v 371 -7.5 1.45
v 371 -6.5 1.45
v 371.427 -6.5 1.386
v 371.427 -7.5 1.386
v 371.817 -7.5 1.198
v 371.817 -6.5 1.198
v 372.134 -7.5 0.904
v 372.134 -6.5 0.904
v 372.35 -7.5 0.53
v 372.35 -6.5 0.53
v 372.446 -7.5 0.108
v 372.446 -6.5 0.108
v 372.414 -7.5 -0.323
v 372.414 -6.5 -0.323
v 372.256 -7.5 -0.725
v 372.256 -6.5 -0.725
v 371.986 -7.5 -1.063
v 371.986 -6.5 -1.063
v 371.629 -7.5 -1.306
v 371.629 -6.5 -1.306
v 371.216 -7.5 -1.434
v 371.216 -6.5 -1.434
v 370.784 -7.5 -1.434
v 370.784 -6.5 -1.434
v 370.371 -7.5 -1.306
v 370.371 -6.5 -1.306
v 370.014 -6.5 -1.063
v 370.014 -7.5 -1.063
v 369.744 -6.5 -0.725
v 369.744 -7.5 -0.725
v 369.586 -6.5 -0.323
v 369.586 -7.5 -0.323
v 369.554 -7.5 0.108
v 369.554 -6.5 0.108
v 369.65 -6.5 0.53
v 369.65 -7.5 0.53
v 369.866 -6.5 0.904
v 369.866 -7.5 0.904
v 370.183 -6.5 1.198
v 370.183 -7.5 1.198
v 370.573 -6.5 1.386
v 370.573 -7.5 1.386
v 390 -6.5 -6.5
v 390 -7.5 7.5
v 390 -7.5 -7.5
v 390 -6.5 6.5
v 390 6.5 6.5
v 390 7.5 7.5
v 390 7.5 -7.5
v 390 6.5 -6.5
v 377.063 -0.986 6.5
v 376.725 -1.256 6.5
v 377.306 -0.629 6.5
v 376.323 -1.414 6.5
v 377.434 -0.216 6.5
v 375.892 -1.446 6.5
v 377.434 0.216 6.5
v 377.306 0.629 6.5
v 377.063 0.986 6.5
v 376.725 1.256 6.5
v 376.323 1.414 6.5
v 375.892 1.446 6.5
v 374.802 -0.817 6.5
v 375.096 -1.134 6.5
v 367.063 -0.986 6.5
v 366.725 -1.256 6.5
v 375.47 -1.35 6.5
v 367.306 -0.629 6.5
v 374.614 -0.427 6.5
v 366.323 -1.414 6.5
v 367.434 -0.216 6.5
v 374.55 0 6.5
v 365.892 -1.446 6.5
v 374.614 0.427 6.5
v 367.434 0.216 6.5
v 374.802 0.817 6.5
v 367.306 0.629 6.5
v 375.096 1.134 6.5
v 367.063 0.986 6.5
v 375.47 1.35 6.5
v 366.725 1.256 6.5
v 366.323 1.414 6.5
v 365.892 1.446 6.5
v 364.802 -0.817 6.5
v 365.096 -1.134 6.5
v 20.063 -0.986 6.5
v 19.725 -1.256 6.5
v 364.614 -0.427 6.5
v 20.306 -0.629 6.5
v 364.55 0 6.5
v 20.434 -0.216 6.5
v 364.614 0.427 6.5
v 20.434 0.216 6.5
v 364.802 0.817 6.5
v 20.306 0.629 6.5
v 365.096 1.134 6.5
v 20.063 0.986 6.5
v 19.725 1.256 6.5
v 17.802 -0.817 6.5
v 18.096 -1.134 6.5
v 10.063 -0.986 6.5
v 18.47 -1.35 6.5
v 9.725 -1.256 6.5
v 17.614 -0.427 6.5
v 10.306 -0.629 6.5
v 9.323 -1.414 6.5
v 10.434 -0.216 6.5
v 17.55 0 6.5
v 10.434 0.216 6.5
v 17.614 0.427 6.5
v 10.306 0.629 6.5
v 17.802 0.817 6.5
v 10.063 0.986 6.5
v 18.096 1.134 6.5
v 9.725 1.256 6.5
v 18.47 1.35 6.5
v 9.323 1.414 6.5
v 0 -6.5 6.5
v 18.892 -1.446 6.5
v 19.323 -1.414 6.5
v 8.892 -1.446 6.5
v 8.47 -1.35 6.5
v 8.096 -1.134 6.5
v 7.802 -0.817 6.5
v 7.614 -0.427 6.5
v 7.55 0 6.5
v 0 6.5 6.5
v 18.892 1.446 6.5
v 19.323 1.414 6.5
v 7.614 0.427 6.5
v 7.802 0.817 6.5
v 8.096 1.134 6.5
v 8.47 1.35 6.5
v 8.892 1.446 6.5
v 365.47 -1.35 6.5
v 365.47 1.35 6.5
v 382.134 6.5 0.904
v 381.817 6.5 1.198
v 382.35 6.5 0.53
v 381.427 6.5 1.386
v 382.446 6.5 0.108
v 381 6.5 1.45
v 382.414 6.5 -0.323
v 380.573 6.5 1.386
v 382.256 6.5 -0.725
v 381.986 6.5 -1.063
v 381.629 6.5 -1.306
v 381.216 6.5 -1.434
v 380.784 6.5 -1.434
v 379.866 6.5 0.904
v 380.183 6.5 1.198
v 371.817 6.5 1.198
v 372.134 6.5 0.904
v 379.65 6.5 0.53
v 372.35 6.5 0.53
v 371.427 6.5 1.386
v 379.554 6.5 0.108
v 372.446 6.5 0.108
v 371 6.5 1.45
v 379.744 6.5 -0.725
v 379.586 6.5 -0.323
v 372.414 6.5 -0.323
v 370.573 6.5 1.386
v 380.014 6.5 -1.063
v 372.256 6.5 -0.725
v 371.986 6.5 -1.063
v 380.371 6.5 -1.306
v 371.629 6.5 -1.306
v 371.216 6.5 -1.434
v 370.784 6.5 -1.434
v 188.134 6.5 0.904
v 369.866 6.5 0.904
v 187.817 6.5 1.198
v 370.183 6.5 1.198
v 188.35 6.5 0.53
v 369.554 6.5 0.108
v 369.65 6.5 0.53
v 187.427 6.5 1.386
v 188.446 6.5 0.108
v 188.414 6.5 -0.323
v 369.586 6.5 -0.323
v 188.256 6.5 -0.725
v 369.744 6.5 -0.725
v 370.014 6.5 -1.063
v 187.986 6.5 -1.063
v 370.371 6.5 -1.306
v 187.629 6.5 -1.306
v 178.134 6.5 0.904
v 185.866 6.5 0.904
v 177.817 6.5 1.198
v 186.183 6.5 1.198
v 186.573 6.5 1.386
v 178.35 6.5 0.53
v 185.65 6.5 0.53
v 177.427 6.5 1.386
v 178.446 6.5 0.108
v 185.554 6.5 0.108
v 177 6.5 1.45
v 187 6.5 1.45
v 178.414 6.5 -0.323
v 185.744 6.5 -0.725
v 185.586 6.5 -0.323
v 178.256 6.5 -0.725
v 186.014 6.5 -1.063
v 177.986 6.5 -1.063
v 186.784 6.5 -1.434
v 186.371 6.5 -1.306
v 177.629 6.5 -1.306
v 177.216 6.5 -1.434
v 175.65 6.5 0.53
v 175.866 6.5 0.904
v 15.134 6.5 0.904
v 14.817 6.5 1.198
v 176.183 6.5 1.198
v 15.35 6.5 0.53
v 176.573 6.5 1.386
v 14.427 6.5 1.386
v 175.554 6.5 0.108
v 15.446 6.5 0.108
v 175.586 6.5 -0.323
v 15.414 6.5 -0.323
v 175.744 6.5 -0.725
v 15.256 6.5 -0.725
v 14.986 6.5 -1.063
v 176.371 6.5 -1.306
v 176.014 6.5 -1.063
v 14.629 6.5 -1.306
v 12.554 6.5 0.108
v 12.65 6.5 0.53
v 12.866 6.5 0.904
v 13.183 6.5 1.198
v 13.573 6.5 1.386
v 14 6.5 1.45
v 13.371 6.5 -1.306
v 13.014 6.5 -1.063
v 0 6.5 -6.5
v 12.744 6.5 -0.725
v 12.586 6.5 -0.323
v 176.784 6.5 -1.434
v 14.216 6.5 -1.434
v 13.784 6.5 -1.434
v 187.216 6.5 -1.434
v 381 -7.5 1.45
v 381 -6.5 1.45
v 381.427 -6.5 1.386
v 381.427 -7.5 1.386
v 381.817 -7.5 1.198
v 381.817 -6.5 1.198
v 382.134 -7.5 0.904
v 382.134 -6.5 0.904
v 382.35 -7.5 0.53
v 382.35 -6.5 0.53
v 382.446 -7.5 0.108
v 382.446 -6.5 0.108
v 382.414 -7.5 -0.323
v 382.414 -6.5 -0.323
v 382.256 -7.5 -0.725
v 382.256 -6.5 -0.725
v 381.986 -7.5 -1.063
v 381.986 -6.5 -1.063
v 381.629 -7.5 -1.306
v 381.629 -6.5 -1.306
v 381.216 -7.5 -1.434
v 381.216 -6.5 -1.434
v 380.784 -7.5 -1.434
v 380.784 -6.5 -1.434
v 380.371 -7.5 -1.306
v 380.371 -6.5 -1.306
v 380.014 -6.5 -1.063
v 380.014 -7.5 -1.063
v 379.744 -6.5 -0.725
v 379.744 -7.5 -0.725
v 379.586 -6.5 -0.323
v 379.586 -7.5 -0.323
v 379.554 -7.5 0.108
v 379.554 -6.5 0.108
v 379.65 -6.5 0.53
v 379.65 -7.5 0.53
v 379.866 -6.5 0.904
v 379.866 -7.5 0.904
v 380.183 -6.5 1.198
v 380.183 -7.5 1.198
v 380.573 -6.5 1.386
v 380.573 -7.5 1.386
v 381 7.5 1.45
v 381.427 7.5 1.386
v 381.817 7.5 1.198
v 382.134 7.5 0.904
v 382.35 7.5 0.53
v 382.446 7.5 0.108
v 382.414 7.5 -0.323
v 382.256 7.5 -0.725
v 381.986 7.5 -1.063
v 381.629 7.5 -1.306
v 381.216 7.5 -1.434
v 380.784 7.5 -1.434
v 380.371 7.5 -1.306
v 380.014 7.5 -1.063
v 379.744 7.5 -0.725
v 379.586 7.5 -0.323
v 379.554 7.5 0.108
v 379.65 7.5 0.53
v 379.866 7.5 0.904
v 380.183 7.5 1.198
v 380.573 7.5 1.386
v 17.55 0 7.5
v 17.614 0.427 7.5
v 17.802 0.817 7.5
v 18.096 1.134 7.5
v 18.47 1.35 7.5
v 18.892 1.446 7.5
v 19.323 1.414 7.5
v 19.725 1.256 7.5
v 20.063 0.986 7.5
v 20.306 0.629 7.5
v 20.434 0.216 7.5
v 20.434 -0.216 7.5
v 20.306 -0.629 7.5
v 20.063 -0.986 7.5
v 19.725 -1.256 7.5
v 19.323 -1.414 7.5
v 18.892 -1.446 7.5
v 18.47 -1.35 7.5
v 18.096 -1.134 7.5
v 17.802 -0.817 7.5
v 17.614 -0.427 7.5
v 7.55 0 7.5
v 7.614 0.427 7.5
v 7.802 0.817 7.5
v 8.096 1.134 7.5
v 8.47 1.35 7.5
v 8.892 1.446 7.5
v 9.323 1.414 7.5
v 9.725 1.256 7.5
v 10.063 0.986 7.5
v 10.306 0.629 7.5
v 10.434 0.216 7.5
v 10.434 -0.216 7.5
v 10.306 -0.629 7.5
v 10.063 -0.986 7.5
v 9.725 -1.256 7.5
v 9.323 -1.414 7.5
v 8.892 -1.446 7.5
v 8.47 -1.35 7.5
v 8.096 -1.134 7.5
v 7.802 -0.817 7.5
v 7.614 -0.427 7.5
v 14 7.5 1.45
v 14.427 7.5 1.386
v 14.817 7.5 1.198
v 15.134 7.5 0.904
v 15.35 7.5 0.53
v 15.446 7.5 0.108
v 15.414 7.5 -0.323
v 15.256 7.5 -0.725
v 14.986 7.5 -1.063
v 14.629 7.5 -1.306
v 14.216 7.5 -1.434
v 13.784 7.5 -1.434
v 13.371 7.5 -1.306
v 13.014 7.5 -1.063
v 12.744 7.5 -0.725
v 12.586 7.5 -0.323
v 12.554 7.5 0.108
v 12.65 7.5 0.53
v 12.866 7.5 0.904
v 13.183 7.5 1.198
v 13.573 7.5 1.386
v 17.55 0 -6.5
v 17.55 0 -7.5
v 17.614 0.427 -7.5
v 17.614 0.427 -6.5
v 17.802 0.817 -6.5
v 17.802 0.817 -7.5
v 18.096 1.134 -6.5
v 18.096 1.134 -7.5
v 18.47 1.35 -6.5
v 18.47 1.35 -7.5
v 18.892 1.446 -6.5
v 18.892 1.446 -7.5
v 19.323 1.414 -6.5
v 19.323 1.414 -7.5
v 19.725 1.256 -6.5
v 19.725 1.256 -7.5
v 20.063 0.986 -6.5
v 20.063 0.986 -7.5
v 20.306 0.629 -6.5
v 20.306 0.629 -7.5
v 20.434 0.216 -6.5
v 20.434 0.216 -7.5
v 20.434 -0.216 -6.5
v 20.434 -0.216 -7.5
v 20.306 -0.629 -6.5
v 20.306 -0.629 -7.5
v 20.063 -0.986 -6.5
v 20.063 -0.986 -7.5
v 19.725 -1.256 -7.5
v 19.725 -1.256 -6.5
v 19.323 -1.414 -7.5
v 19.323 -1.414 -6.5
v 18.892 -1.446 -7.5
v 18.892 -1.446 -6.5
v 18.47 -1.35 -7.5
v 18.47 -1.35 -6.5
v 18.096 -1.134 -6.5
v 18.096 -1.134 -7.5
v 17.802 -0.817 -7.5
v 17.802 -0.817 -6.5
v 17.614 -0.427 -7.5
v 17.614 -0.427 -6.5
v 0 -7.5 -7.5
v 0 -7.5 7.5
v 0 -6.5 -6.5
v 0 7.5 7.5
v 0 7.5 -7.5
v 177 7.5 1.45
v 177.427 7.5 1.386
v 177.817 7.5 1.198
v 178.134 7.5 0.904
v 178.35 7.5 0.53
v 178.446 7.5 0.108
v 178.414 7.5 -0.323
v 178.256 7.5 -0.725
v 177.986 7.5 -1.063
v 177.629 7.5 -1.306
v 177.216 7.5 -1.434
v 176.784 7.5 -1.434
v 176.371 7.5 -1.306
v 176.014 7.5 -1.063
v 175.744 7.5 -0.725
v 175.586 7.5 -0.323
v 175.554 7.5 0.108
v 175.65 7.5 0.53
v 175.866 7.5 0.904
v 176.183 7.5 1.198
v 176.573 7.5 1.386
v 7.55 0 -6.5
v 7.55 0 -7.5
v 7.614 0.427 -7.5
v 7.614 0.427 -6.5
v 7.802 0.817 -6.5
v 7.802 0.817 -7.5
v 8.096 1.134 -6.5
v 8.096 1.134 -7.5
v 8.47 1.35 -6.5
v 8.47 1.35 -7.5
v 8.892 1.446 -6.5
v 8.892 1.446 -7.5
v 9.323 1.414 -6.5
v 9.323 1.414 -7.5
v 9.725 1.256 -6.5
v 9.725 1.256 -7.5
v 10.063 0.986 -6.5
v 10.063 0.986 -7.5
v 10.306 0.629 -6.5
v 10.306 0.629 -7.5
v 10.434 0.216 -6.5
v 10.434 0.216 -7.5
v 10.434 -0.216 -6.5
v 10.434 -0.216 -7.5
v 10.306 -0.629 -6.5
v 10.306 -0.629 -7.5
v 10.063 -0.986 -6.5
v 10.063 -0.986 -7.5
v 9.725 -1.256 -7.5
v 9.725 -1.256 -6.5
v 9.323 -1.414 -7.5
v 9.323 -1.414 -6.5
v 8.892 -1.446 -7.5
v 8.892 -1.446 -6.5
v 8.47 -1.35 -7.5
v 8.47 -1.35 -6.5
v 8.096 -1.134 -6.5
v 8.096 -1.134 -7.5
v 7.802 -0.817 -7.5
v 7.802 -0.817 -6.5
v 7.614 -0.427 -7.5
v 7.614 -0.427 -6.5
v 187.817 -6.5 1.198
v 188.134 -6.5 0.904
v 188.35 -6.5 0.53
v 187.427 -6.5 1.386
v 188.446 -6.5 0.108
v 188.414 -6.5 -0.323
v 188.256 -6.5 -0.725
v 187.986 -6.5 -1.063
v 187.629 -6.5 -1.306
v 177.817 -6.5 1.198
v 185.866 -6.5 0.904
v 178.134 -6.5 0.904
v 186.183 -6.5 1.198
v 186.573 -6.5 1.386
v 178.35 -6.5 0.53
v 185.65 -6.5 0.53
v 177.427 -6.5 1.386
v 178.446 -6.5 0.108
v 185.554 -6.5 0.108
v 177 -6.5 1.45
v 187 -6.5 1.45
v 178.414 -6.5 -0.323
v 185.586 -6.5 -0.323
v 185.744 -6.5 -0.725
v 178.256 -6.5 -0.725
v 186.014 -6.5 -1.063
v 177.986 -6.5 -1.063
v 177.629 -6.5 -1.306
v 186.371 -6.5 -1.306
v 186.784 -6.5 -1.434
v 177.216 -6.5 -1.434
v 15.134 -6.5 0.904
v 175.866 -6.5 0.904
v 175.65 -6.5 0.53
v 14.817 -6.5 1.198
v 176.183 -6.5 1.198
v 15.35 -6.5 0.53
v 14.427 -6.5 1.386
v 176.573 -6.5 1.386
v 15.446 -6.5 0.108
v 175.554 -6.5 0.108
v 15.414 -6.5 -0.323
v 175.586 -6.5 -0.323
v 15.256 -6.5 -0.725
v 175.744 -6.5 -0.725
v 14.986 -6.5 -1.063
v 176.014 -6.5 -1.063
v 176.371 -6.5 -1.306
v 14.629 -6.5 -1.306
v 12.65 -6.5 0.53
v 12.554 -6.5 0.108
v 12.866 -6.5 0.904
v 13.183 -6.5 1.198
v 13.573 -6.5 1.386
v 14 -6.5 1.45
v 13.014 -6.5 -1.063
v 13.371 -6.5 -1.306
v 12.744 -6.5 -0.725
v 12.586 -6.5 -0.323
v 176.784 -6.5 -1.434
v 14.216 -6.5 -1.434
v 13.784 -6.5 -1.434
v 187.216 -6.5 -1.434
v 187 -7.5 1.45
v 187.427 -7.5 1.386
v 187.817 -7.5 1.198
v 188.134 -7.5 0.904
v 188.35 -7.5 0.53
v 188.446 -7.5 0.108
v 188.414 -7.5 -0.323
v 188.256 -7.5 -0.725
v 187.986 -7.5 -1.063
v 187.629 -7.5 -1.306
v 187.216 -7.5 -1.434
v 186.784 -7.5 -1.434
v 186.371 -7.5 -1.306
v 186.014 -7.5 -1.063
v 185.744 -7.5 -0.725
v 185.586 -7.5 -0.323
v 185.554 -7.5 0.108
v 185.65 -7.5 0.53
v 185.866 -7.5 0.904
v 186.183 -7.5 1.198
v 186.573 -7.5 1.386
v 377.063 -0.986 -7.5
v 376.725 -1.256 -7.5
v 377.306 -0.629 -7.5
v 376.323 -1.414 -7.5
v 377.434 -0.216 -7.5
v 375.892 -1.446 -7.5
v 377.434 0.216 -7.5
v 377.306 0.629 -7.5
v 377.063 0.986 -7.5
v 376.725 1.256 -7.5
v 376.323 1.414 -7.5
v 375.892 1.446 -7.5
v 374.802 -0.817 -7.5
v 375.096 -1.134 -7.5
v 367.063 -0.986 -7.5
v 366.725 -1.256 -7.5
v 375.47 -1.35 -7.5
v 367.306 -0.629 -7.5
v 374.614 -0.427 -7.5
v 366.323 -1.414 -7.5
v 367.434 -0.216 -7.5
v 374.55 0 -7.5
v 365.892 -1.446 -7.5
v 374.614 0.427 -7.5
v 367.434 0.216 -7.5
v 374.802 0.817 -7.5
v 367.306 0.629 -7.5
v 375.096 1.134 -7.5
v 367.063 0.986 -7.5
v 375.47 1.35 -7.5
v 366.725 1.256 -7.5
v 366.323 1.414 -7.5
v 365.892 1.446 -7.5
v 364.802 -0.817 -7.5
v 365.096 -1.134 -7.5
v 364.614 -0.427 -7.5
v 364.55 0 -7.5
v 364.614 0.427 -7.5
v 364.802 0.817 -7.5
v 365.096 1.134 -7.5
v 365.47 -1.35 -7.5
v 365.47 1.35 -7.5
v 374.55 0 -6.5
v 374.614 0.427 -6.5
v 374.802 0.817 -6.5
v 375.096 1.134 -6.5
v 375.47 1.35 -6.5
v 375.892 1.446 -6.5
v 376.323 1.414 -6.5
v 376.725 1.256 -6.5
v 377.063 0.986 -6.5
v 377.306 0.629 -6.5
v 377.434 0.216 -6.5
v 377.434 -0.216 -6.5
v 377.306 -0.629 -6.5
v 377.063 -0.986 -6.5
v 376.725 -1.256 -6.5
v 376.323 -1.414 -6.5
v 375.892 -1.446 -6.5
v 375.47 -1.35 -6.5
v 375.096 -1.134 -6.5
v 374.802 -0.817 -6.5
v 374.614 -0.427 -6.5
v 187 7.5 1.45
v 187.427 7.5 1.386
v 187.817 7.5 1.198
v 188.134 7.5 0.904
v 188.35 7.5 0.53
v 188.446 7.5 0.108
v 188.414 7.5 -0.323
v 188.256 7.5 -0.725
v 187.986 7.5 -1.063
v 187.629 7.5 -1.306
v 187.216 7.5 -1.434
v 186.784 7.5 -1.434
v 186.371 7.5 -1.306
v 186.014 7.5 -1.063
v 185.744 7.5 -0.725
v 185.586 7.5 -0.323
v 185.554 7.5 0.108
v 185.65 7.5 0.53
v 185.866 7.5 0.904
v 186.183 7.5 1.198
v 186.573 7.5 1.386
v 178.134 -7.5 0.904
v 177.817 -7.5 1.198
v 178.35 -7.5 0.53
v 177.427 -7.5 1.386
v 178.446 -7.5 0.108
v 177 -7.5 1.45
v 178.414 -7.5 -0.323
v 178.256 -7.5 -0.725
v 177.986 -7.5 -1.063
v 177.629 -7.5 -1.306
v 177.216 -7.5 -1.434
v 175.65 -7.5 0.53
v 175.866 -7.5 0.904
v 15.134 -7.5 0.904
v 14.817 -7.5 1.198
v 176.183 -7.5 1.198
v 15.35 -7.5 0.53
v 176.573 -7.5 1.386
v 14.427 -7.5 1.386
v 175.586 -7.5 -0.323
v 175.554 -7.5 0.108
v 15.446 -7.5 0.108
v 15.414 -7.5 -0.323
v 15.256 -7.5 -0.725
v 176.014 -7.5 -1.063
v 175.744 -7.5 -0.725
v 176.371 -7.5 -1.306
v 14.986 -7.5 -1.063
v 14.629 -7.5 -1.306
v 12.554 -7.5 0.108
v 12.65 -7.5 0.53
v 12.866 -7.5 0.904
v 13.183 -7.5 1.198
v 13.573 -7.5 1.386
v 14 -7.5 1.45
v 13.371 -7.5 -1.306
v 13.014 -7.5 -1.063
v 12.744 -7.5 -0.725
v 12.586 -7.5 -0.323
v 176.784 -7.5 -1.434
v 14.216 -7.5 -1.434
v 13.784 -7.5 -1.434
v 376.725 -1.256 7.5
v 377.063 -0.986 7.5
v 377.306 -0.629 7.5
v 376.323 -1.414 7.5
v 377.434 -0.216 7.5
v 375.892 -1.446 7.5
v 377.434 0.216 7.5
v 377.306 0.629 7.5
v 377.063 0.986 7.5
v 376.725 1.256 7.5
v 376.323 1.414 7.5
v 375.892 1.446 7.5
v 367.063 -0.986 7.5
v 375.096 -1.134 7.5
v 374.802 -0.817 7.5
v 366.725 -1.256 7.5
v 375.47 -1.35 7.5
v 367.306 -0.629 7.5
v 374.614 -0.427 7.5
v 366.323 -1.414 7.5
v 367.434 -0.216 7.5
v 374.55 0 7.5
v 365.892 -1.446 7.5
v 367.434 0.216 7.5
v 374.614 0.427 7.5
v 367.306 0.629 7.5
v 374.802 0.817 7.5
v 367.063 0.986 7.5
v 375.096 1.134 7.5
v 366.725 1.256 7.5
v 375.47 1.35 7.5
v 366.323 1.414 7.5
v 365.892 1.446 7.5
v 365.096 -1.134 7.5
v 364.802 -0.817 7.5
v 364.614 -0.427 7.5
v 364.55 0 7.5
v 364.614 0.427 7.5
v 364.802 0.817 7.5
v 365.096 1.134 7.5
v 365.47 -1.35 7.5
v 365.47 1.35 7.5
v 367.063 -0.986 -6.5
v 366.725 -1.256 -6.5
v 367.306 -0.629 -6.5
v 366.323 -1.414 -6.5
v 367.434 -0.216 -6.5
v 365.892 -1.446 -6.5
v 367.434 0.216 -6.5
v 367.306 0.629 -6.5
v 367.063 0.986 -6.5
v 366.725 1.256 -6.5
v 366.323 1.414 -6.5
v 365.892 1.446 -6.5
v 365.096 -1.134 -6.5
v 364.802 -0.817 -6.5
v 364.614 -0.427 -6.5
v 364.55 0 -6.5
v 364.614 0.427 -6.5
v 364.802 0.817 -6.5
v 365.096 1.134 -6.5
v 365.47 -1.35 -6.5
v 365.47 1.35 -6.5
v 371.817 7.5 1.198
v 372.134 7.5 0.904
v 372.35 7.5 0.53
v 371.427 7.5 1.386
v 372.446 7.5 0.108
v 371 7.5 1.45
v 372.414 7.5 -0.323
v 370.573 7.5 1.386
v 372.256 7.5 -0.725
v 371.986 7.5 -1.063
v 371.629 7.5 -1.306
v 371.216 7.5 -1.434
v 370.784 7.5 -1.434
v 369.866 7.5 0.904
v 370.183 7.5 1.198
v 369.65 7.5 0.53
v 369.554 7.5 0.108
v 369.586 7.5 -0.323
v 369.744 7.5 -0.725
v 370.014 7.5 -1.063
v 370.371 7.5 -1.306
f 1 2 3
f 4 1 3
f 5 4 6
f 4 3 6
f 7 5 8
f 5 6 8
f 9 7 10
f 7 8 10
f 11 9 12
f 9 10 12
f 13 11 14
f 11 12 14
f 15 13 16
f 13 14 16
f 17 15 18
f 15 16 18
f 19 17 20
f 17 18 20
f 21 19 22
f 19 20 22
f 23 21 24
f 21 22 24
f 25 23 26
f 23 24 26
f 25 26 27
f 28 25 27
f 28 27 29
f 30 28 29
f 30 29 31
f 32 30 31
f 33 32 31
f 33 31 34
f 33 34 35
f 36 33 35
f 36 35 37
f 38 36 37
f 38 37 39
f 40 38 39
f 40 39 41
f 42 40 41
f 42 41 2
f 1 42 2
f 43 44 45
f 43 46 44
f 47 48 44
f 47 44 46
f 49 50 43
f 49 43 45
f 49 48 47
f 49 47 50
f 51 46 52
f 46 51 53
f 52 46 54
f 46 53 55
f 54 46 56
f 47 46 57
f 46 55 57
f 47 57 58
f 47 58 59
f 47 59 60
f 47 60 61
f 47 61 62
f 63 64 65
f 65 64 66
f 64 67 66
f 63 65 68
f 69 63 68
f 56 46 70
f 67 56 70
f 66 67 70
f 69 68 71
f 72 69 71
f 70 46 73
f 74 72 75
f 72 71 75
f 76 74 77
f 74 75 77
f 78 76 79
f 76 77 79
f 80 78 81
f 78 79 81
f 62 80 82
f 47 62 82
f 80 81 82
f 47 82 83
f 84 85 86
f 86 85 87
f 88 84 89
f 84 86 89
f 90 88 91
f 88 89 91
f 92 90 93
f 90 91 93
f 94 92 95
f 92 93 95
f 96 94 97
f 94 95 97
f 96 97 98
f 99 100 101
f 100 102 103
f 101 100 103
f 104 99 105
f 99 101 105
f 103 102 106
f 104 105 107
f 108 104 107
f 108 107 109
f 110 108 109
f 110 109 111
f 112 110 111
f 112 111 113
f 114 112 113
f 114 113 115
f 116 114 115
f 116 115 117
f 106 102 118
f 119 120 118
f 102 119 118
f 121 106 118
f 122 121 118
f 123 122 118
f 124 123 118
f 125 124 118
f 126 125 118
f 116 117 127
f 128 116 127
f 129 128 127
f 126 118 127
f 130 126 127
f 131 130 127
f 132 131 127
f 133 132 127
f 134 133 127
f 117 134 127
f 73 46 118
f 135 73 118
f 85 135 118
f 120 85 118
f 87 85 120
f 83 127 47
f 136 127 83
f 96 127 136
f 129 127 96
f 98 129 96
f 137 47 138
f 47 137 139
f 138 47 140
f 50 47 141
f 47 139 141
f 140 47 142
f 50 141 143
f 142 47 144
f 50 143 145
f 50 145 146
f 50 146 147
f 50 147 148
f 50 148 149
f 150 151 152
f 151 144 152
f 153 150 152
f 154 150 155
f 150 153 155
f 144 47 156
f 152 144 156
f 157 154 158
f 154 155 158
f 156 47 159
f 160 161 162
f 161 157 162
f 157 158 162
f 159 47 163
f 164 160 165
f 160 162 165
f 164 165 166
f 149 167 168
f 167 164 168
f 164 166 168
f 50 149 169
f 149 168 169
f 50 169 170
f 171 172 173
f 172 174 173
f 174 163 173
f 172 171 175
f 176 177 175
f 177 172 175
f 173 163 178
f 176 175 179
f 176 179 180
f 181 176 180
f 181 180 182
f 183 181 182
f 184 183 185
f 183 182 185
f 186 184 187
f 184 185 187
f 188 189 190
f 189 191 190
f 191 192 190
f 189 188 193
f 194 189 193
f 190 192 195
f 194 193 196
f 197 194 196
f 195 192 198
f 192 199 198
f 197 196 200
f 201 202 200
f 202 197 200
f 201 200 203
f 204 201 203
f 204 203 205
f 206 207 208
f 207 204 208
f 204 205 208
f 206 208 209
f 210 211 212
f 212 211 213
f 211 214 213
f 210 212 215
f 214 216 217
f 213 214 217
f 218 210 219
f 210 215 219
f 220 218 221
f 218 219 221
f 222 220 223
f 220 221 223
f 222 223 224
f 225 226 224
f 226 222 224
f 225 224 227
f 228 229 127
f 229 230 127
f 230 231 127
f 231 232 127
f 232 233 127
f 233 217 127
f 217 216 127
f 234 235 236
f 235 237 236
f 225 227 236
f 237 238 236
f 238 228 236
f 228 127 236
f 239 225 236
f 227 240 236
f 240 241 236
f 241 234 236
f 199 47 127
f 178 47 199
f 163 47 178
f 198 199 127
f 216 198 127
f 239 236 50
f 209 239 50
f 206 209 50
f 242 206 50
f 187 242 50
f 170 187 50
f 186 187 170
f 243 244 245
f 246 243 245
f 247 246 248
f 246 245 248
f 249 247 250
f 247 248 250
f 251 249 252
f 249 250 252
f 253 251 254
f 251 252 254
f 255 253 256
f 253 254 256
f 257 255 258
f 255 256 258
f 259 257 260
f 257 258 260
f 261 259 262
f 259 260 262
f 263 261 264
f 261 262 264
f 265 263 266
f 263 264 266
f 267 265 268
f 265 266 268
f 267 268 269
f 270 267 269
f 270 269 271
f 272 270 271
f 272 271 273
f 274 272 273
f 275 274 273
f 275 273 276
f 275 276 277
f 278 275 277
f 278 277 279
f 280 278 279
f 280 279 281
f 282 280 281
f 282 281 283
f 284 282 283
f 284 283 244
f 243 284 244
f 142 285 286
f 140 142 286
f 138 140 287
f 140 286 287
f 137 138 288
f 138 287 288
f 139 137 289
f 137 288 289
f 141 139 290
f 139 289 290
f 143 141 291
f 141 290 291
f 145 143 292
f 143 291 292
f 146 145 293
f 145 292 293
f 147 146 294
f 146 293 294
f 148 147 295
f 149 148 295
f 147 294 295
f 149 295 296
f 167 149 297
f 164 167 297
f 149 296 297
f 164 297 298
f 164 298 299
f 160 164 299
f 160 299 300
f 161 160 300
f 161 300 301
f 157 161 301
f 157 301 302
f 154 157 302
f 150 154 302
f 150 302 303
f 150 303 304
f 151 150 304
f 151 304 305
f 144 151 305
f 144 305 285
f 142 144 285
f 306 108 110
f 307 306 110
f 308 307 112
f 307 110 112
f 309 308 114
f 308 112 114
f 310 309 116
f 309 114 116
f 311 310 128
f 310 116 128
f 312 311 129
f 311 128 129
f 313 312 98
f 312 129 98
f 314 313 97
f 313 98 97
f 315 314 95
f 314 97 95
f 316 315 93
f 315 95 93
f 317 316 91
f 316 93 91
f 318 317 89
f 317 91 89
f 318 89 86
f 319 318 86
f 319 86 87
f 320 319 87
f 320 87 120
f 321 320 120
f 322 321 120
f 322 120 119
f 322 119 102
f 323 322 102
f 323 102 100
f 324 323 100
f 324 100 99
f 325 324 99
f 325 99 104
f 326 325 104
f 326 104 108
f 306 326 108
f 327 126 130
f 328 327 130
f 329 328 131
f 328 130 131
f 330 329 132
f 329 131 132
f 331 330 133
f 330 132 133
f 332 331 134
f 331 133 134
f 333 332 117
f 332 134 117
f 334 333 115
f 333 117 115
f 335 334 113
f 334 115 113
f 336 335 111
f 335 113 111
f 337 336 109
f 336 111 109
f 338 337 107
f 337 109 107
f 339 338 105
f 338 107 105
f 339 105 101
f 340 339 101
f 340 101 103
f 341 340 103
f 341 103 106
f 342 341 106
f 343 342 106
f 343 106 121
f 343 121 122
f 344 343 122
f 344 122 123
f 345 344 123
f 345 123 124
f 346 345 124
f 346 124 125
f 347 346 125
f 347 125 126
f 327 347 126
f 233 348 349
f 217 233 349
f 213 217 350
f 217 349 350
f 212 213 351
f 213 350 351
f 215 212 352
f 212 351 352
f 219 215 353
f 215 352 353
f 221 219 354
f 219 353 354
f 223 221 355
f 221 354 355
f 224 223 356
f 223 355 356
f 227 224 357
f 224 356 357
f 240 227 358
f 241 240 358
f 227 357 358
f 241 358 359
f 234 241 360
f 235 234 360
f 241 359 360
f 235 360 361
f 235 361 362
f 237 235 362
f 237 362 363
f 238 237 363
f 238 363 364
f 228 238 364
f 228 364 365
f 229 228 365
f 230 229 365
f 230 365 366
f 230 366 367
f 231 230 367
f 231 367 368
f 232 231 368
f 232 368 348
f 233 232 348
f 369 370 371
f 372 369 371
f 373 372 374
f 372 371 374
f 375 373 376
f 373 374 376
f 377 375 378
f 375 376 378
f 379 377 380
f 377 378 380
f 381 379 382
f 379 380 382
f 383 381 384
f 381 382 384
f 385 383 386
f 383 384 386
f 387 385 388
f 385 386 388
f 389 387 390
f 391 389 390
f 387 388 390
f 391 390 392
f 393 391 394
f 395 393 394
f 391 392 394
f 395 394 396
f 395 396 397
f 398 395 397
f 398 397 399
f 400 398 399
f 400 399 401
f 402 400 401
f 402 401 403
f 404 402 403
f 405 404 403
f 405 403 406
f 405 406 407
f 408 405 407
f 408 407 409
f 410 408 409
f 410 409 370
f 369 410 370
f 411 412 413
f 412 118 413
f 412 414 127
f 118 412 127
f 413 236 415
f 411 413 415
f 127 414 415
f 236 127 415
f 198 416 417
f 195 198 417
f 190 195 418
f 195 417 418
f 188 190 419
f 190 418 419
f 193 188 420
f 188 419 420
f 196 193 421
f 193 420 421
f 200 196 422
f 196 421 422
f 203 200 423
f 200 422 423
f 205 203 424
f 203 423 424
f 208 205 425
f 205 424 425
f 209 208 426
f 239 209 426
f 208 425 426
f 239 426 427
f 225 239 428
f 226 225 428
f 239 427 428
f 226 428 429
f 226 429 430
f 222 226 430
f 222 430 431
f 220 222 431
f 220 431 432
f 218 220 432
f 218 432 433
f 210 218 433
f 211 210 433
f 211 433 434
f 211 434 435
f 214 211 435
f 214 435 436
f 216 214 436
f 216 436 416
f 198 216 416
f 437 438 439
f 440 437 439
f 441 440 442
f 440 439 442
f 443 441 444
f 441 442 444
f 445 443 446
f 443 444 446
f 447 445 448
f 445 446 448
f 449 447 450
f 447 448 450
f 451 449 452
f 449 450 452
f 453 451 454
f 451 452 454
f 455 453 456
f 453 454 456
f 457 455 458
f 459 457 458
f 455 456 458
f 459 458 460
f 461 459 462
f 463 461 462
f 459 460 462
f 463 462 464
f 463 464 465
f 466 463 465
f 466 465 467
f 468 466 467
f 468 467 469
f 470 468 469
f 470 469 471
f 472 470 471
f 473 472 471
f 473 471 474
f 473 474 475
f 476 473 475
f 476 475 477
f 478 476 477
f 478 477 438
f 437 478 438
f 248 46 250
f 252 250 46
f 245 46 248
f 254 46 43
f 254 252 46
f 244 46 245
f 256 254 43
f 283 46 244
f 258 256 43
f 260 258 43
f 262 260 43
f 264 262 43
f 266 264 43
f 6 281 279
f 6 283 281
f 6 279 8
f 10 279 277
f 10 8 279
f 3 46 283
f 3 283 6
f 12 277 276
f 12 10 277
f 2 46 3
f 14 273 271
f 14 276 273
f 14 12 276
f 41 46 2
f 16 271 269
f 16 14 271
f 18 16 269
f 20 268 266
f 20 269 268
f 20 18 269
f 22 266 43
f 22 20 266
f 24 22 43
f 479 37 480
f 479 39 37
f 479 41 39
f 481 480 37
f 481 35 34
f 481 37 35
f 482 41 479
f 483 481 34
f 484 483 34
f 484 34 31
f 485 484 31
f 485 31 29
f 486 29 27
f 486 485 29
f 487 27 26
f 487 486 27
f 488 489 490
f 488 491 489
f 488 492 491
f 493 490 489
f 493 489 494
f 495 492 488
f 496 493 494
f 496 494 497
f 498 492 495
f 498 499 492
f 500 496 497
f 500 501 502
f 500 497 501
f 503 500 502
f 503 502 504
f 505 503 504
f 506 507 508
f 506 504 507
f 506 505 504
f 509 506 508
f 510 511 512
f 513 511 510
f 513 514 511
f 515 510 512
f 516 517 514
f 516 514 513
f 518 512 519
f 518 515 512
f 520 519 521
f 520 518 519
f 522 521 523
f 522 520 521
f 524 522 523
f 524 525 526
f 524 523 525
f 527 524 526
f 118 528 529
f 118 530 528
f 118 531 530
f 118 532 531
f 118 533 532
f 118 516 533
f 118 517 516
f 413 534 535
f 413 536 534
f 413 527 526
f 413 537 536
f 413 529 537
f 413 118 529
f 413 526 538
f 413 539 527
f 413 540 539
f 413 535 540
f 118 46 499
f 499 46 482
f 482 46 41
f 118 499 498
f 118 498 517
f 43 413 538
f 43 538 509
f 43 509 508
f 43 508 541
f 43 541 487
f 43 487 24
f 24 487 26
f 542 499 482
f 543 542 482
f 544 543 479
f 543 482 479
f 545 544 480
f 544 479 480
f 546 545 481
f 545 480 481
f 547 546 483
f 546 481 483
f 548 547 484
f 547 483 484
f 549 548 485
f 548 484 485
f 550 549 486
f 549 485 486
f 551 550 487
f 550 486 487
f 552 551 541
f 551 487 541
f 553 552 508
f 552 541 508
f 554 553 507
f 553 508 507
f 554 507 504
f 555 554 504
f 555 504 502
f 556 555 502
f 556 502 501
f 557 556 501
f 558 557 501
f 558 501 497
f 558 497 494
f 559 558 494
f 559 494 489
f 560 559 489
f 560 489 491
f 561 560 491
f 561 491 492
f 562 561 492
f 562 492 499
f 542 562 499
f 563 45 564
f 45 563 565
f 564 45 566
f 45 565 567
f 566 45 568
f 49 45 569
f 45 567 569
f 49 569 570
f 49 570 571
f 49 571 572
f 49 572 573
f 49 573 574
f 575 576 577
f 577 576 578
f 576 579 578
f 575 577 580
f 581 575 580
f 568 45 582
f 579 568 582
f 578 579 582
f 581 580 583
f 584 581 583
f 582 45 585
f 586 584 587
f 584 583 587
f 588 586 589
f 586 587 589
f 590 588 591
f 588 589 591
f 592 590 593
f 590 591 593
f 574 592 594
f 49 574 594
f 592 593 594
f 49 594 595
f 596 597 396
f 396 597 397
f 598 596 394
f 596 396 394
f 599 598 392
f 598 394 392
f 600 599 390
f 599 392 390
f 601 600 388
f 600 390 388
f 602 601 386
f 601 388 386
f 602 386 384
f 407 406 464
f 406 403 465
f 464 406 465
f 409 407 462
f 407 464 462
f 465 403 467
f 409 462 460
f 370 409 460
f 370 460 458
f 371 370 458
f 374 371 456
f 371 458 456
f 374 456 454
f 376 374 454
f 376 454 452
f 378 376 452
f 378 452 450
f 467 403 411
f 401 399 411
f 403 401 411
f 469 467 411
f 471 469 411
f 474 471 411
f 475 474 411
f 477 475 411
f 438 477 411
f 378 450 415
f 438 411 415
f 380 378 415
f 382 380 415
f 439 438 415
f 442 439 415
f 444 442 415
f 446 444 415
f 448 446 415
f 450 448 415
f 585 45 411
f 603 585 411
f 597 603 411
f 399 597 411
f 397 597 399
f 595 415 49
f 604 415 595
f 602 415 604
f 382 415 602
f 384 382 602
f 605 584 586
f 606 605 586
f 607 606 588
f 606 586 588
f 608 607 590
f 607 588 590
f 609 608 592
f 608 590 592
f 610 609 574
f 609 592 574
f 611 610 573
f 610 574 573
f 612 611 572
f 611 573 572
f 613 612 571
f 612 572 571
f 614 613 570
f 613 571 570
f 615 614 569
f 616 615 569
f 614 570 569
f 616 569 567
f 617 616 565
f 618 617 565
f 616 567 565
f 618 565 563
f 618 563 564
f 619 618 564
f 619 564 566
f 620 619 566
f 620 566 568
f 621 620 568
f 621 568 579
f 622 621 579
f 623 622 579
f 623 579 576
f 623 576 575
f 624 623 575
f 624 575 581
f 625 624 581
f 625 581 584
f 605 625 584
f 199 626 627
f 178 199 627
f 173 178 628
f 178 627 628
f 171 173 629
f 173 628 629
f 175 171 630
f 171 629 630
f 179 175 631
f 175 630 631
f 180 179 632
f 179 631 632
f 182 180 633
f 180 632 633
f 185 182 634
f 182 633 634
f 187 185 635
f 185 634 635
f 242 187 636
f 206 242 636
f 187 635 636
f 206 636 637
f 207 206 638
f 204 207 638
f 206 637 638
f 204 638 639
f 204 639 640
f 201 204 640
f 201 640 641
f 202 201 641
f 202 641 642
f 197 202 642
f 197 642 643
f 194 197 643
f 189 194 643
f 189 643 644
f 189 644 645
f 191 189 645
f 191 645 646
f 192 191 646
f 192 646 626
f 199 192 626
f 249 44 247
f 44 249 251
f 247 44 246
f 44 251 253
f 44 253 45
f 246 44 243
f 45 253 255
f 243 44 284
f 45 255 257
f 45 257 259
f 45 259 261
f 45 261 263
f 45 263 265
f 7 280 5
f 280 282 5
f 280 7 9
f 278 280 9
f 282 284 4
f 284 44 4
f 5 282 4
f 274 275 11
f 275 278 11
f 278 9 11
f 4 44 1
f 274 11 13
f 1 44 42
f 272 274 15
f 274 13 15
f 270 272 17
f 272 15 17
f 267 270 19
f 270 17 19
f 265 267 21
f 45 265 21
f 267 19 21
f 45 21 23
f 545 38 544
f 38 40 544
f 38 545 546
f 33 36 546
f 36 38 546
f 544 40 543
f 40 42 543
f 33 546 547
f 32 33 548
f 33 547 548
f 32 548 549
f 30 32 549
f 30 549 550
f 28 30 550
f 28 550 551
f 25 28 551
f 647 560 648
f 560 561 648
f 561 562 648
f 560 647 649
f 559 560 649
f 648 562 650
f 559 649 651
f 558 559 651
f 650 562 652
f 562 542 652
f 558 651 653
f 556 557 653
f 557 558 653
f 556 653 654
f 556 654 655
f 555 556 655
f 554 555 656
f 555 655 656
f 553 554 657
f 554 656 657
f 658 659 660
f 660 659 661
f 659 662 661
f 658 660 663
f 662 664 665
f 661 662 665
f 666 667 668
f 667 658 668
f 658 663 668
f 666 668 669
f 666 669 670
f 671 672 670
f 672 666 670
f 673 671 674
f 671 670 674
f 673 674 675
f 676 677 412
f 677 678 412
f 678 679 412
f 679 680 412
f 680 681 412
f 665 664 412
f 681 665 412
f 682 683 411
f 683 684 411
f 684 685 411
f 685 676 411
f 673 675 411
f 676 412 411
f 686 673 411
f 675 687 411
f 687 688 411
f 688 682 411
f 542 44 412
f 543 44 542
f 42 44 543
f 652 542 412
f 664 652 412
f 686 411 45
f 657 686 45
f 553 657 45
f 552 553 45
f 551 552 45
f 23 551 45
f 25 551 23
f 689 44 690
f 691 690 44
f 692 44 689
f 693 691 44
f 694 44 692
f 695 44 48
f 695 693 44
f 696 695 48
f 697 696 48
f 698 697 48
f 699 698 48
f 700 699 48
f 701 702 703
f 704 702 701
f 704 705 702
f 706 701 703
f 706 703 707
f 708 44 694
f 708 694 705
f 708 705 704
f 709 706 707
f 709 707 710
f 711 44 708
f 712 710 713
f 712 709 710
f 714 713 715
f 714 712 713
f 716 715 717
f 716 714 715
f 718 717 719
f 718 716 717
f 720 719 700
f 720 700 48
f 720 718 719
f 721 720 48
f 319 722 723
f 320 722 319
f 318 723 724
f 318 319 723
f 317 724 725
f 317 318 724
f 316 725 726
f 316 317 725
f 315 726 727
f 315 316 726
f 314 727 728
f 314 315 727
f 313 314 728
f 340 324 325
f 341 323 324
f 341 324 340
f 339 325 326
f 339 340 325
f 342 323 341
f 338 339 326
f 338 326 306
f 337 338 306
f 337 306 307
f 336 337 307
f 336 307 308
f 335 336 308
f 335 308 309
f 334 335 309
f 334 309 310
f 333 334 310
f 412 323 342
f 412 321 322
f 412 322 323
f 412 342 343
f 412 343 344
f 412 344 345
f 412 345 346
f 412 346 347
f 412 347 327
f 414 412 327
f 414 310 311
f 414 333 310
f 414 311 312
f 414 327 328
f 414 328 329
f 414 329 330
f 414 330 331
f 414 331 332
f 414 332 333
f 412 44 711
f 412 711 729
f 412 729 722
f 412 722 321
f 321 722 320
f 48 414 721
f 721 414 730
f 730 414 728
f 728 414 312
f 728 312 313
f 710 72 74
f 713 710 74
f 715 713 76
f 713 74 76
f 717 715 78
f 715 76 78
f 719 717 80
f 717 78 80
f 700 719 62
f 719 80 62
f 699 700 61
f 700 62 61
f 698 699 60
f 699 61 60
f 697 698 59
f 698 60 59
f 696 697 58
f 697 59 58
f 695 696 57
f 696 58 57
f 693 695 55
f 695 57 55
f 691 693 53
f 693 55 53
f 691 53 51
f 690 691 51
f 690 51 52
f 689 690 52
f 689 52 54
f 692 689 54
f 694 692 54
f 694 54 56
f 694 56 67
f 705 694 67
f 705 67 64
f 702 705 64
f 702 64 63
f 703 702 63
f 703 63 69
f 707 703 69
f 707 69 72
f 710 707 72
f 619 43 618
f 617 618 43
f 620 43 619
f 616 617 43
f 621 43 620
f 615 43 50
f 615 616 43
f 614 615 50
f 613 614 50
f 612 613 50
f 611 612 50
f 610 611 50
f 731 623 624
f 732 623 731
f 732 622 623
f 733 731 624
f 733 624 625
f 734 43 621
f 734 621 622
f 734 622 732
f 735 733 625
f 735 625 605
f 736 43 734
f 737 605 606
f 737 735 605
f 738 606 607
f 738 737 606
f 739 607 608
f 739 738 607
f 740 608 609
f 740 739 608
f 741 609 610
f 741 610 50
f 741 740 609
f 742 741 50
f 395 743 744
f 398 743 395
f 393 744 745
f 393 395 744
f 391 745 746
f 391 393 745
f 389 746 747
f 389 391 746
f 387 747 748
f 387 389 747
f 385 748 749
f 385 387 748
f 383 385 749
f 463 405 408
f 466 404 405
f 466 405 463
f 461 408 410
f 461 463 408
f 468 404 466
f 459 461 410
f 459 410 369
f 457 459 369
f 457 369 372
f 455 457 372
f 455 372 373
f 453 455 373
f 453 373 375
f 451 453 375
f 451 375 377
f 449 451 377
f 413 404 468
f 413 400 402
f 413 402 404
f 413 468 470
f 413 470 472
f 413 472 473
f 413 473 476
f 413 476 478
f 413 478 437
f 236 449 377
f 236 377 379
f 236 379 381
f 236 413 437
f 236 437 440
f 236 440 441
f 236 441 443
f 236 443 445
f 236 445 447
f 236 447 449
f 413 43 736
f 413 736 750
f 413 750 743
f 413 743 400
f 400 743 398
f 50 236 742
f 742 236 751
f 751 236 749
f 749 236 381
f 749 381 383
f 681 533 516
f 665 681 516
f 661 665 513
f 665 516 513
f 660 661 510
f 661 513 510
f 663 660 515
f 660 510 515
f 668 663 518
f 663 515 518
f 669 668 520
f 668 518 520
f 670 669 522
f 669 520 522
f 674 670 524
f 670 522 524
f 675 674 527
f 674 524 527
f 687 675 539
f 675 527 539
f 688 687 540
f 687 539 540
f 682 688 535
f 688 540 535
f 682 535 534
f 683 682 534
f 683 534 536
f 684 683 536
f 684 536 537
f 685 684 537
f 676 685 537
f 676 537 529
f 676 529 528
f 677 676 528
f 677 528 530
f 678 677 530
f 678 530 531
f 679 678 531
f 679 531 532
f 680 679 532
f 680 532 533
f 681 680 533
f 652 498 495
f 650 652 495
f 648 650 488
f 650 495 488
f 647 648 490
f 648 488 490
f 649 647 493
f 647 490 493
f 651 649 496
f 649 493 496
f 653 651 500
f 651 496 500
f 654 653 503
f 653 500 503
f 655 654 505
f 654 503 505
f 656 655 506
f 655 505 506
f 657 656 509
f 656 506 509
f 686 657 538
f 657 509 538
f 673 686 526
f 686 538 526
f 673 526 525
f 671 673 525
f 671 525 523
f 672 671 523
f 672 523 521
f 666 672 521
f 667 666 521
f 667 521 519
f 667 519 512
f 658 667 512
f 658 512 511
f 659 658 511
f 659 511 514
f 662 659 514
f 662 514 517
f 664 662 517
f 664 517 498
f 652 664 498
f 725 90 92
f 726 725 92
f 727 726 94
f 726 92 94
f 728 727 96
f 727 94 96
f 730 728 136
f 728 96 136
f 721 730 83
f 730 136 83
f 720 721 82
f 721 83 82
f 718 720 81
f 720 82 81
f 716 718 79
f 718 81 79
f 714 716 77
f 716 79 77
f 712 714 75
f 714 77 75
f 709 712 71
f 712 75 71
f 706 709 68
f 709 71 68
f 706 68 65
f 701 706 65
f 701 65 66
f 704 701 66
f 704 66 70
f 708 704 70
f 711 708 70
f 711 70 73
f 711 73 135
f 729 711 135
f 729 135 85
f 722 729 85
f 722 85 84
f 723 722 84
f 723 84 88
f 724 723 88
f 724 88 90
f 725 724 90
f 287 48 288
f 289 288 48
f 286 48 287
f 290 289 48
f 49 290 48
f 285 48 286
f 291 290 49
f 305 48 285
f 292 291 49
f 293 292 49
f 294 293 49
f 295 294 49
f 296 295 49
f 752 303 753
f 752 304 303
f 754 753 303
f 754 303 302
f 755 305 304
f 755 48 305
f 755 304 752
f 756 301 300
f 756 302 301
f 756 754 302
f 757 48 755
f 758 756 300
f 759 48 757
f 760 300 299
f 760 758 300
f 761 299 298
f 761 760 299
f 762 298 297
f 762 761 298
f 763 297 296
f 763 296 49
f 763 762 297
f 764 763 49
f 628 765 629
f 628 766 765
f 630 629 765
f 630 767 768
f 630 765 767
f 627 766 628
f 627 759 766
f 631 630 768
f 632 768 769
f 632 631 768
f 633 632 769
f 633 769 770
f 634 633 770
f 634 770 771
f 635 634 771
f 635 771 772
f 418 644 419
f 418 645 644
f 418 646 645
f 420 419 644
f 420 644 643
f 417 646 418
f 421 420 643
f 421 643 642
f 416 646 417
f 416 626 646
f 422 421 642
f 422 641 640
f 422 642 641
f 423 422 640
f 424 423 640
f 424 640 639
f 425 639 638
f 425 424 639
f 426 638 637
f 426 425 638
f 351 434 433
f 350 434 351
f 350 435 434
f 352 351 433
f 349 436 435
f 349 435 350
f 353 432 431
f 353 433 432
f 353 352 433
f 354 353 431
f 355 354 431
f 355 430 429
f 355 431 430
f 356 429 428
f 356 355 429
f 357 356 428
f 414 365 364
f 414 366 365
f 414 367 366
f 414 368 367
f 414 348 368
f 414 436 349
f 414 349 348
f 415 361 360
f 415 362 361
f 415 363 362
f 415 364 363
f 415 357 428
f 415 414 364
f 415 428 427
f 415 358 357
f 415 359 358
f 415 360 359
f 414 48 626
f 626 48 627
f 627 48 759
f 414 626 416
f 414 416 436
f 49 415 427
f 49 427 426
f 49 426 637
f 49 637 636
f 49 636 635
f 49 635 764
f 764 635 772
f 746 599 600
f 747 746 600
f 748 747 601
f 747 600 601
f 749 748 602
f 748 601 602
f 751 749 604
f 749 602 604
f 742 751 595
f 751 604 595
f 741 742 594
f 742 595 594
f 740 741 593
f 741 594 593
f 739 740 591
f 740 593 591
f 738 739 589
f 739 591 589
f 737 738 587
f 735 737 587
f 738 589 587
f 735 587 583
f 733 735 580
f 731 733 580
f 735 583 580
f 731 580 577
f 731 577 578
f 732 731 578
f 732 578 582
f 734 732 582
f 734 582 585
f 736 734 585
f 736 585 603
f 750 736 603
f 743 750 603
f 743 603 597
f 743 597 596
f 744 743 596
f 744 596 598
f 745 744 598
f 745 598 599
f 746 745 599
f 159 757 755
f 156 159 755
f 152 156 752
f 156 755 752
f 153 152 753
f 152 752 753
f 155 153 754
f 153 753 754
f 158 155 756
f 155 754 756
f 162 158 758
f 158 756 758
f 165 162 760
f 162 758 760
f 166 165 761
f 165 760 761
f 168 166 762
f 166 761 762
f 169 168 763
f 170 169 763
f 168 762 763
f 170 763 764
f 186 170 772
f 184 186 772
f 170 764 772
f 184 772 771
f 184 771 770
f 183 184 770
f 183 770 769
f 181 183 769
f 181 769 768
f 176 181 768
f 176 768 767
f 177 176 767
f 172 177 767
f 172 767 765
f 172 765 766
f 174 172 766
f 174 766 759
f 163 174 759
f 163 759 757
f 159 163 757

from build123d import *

# Parameters (mm, degrees)
SKETCH_1_W          = 15
SKETCH_1_H          = 15
SKETCH_1_W_2        = 13
SKETCH_1_H_2        = 13
EXTRUDE_1_DEPTH     = 390
SKETCH_2_R          = 1.45
CUT_EXTRUDE_1_DEPTH = 391.36041039
SKETCH_3_R          = 1.45
CUT_EXTRUDE_2_DEPTH = 391.36041039


with BuildPart() as part:
    # 草图1 → 凸台-拉伸1 (new body)
    with BuildSketch(Plane(origin=(0, 0, 0), x_dir=(0, 0, -1), z_dir=(1, 0, 0))):
        Rectangle(SKETCH_1_W, SKETCH_1_H)
        Rectangle(SKETCH_1_W_2, SKETCH_1_H_2, mode=Mode.SUBTRACT)
    extrude(amount=EXTRUDE_1_DEPTH)

    # 草图2 → 切除-拉伸1 (cut, through all)
    with BuildSketch(Plane(origin=(0, 0, -7.5), x_dir=(-1, 0, 0), z_dir=(0, 0, -1))):
        with Locations((-366, 0)):
            Circle(SKETCH_2_R)
        with Locations((-376, 0)):
            Circle(SKETCH_2_R)
        with Locations((-19, 0)):
            Circle(SKETCH_2_R)
        with Locations((-9, 0)):
            Circle(SKETCH_2_R)
    extrude(amount=-CUT_EXTRUDE_1_DEPTH, mode=Mode.SUBTRACT)

    # 草图3 → 切除-拉伸2 (cut, through all)
    with BuildSketch(Plane(origin=(0, 7.5, 0), x_dir=(1, 0, 0), z_dir=(0, 1, 0))):
        with Locations(Location((371, 0, 0), (0, 0, 270))):
            Circle(SKETCH_3_R)
        with Locations(Location((381, 0, 0), (0, 0, 270))):
            Circle(SKETCH_3_R)
        with Locations(Location((14, 0, 0), (0, 0, 270))):
            Circle(SKETCH_3_R)
        with Locations(Location((177, 0, 0), (0, 0, 270))):
            Circle(SKETCH_3_R)
        with Locations(Location((187, 0, 0), (0, 0, 270))):
            Circle(SKETCH_3_R)
    extrude(amount=-CUT_EXTRUDE_2_DEPTH, mode=Mode.SUBTRACT)


solid = part.part
